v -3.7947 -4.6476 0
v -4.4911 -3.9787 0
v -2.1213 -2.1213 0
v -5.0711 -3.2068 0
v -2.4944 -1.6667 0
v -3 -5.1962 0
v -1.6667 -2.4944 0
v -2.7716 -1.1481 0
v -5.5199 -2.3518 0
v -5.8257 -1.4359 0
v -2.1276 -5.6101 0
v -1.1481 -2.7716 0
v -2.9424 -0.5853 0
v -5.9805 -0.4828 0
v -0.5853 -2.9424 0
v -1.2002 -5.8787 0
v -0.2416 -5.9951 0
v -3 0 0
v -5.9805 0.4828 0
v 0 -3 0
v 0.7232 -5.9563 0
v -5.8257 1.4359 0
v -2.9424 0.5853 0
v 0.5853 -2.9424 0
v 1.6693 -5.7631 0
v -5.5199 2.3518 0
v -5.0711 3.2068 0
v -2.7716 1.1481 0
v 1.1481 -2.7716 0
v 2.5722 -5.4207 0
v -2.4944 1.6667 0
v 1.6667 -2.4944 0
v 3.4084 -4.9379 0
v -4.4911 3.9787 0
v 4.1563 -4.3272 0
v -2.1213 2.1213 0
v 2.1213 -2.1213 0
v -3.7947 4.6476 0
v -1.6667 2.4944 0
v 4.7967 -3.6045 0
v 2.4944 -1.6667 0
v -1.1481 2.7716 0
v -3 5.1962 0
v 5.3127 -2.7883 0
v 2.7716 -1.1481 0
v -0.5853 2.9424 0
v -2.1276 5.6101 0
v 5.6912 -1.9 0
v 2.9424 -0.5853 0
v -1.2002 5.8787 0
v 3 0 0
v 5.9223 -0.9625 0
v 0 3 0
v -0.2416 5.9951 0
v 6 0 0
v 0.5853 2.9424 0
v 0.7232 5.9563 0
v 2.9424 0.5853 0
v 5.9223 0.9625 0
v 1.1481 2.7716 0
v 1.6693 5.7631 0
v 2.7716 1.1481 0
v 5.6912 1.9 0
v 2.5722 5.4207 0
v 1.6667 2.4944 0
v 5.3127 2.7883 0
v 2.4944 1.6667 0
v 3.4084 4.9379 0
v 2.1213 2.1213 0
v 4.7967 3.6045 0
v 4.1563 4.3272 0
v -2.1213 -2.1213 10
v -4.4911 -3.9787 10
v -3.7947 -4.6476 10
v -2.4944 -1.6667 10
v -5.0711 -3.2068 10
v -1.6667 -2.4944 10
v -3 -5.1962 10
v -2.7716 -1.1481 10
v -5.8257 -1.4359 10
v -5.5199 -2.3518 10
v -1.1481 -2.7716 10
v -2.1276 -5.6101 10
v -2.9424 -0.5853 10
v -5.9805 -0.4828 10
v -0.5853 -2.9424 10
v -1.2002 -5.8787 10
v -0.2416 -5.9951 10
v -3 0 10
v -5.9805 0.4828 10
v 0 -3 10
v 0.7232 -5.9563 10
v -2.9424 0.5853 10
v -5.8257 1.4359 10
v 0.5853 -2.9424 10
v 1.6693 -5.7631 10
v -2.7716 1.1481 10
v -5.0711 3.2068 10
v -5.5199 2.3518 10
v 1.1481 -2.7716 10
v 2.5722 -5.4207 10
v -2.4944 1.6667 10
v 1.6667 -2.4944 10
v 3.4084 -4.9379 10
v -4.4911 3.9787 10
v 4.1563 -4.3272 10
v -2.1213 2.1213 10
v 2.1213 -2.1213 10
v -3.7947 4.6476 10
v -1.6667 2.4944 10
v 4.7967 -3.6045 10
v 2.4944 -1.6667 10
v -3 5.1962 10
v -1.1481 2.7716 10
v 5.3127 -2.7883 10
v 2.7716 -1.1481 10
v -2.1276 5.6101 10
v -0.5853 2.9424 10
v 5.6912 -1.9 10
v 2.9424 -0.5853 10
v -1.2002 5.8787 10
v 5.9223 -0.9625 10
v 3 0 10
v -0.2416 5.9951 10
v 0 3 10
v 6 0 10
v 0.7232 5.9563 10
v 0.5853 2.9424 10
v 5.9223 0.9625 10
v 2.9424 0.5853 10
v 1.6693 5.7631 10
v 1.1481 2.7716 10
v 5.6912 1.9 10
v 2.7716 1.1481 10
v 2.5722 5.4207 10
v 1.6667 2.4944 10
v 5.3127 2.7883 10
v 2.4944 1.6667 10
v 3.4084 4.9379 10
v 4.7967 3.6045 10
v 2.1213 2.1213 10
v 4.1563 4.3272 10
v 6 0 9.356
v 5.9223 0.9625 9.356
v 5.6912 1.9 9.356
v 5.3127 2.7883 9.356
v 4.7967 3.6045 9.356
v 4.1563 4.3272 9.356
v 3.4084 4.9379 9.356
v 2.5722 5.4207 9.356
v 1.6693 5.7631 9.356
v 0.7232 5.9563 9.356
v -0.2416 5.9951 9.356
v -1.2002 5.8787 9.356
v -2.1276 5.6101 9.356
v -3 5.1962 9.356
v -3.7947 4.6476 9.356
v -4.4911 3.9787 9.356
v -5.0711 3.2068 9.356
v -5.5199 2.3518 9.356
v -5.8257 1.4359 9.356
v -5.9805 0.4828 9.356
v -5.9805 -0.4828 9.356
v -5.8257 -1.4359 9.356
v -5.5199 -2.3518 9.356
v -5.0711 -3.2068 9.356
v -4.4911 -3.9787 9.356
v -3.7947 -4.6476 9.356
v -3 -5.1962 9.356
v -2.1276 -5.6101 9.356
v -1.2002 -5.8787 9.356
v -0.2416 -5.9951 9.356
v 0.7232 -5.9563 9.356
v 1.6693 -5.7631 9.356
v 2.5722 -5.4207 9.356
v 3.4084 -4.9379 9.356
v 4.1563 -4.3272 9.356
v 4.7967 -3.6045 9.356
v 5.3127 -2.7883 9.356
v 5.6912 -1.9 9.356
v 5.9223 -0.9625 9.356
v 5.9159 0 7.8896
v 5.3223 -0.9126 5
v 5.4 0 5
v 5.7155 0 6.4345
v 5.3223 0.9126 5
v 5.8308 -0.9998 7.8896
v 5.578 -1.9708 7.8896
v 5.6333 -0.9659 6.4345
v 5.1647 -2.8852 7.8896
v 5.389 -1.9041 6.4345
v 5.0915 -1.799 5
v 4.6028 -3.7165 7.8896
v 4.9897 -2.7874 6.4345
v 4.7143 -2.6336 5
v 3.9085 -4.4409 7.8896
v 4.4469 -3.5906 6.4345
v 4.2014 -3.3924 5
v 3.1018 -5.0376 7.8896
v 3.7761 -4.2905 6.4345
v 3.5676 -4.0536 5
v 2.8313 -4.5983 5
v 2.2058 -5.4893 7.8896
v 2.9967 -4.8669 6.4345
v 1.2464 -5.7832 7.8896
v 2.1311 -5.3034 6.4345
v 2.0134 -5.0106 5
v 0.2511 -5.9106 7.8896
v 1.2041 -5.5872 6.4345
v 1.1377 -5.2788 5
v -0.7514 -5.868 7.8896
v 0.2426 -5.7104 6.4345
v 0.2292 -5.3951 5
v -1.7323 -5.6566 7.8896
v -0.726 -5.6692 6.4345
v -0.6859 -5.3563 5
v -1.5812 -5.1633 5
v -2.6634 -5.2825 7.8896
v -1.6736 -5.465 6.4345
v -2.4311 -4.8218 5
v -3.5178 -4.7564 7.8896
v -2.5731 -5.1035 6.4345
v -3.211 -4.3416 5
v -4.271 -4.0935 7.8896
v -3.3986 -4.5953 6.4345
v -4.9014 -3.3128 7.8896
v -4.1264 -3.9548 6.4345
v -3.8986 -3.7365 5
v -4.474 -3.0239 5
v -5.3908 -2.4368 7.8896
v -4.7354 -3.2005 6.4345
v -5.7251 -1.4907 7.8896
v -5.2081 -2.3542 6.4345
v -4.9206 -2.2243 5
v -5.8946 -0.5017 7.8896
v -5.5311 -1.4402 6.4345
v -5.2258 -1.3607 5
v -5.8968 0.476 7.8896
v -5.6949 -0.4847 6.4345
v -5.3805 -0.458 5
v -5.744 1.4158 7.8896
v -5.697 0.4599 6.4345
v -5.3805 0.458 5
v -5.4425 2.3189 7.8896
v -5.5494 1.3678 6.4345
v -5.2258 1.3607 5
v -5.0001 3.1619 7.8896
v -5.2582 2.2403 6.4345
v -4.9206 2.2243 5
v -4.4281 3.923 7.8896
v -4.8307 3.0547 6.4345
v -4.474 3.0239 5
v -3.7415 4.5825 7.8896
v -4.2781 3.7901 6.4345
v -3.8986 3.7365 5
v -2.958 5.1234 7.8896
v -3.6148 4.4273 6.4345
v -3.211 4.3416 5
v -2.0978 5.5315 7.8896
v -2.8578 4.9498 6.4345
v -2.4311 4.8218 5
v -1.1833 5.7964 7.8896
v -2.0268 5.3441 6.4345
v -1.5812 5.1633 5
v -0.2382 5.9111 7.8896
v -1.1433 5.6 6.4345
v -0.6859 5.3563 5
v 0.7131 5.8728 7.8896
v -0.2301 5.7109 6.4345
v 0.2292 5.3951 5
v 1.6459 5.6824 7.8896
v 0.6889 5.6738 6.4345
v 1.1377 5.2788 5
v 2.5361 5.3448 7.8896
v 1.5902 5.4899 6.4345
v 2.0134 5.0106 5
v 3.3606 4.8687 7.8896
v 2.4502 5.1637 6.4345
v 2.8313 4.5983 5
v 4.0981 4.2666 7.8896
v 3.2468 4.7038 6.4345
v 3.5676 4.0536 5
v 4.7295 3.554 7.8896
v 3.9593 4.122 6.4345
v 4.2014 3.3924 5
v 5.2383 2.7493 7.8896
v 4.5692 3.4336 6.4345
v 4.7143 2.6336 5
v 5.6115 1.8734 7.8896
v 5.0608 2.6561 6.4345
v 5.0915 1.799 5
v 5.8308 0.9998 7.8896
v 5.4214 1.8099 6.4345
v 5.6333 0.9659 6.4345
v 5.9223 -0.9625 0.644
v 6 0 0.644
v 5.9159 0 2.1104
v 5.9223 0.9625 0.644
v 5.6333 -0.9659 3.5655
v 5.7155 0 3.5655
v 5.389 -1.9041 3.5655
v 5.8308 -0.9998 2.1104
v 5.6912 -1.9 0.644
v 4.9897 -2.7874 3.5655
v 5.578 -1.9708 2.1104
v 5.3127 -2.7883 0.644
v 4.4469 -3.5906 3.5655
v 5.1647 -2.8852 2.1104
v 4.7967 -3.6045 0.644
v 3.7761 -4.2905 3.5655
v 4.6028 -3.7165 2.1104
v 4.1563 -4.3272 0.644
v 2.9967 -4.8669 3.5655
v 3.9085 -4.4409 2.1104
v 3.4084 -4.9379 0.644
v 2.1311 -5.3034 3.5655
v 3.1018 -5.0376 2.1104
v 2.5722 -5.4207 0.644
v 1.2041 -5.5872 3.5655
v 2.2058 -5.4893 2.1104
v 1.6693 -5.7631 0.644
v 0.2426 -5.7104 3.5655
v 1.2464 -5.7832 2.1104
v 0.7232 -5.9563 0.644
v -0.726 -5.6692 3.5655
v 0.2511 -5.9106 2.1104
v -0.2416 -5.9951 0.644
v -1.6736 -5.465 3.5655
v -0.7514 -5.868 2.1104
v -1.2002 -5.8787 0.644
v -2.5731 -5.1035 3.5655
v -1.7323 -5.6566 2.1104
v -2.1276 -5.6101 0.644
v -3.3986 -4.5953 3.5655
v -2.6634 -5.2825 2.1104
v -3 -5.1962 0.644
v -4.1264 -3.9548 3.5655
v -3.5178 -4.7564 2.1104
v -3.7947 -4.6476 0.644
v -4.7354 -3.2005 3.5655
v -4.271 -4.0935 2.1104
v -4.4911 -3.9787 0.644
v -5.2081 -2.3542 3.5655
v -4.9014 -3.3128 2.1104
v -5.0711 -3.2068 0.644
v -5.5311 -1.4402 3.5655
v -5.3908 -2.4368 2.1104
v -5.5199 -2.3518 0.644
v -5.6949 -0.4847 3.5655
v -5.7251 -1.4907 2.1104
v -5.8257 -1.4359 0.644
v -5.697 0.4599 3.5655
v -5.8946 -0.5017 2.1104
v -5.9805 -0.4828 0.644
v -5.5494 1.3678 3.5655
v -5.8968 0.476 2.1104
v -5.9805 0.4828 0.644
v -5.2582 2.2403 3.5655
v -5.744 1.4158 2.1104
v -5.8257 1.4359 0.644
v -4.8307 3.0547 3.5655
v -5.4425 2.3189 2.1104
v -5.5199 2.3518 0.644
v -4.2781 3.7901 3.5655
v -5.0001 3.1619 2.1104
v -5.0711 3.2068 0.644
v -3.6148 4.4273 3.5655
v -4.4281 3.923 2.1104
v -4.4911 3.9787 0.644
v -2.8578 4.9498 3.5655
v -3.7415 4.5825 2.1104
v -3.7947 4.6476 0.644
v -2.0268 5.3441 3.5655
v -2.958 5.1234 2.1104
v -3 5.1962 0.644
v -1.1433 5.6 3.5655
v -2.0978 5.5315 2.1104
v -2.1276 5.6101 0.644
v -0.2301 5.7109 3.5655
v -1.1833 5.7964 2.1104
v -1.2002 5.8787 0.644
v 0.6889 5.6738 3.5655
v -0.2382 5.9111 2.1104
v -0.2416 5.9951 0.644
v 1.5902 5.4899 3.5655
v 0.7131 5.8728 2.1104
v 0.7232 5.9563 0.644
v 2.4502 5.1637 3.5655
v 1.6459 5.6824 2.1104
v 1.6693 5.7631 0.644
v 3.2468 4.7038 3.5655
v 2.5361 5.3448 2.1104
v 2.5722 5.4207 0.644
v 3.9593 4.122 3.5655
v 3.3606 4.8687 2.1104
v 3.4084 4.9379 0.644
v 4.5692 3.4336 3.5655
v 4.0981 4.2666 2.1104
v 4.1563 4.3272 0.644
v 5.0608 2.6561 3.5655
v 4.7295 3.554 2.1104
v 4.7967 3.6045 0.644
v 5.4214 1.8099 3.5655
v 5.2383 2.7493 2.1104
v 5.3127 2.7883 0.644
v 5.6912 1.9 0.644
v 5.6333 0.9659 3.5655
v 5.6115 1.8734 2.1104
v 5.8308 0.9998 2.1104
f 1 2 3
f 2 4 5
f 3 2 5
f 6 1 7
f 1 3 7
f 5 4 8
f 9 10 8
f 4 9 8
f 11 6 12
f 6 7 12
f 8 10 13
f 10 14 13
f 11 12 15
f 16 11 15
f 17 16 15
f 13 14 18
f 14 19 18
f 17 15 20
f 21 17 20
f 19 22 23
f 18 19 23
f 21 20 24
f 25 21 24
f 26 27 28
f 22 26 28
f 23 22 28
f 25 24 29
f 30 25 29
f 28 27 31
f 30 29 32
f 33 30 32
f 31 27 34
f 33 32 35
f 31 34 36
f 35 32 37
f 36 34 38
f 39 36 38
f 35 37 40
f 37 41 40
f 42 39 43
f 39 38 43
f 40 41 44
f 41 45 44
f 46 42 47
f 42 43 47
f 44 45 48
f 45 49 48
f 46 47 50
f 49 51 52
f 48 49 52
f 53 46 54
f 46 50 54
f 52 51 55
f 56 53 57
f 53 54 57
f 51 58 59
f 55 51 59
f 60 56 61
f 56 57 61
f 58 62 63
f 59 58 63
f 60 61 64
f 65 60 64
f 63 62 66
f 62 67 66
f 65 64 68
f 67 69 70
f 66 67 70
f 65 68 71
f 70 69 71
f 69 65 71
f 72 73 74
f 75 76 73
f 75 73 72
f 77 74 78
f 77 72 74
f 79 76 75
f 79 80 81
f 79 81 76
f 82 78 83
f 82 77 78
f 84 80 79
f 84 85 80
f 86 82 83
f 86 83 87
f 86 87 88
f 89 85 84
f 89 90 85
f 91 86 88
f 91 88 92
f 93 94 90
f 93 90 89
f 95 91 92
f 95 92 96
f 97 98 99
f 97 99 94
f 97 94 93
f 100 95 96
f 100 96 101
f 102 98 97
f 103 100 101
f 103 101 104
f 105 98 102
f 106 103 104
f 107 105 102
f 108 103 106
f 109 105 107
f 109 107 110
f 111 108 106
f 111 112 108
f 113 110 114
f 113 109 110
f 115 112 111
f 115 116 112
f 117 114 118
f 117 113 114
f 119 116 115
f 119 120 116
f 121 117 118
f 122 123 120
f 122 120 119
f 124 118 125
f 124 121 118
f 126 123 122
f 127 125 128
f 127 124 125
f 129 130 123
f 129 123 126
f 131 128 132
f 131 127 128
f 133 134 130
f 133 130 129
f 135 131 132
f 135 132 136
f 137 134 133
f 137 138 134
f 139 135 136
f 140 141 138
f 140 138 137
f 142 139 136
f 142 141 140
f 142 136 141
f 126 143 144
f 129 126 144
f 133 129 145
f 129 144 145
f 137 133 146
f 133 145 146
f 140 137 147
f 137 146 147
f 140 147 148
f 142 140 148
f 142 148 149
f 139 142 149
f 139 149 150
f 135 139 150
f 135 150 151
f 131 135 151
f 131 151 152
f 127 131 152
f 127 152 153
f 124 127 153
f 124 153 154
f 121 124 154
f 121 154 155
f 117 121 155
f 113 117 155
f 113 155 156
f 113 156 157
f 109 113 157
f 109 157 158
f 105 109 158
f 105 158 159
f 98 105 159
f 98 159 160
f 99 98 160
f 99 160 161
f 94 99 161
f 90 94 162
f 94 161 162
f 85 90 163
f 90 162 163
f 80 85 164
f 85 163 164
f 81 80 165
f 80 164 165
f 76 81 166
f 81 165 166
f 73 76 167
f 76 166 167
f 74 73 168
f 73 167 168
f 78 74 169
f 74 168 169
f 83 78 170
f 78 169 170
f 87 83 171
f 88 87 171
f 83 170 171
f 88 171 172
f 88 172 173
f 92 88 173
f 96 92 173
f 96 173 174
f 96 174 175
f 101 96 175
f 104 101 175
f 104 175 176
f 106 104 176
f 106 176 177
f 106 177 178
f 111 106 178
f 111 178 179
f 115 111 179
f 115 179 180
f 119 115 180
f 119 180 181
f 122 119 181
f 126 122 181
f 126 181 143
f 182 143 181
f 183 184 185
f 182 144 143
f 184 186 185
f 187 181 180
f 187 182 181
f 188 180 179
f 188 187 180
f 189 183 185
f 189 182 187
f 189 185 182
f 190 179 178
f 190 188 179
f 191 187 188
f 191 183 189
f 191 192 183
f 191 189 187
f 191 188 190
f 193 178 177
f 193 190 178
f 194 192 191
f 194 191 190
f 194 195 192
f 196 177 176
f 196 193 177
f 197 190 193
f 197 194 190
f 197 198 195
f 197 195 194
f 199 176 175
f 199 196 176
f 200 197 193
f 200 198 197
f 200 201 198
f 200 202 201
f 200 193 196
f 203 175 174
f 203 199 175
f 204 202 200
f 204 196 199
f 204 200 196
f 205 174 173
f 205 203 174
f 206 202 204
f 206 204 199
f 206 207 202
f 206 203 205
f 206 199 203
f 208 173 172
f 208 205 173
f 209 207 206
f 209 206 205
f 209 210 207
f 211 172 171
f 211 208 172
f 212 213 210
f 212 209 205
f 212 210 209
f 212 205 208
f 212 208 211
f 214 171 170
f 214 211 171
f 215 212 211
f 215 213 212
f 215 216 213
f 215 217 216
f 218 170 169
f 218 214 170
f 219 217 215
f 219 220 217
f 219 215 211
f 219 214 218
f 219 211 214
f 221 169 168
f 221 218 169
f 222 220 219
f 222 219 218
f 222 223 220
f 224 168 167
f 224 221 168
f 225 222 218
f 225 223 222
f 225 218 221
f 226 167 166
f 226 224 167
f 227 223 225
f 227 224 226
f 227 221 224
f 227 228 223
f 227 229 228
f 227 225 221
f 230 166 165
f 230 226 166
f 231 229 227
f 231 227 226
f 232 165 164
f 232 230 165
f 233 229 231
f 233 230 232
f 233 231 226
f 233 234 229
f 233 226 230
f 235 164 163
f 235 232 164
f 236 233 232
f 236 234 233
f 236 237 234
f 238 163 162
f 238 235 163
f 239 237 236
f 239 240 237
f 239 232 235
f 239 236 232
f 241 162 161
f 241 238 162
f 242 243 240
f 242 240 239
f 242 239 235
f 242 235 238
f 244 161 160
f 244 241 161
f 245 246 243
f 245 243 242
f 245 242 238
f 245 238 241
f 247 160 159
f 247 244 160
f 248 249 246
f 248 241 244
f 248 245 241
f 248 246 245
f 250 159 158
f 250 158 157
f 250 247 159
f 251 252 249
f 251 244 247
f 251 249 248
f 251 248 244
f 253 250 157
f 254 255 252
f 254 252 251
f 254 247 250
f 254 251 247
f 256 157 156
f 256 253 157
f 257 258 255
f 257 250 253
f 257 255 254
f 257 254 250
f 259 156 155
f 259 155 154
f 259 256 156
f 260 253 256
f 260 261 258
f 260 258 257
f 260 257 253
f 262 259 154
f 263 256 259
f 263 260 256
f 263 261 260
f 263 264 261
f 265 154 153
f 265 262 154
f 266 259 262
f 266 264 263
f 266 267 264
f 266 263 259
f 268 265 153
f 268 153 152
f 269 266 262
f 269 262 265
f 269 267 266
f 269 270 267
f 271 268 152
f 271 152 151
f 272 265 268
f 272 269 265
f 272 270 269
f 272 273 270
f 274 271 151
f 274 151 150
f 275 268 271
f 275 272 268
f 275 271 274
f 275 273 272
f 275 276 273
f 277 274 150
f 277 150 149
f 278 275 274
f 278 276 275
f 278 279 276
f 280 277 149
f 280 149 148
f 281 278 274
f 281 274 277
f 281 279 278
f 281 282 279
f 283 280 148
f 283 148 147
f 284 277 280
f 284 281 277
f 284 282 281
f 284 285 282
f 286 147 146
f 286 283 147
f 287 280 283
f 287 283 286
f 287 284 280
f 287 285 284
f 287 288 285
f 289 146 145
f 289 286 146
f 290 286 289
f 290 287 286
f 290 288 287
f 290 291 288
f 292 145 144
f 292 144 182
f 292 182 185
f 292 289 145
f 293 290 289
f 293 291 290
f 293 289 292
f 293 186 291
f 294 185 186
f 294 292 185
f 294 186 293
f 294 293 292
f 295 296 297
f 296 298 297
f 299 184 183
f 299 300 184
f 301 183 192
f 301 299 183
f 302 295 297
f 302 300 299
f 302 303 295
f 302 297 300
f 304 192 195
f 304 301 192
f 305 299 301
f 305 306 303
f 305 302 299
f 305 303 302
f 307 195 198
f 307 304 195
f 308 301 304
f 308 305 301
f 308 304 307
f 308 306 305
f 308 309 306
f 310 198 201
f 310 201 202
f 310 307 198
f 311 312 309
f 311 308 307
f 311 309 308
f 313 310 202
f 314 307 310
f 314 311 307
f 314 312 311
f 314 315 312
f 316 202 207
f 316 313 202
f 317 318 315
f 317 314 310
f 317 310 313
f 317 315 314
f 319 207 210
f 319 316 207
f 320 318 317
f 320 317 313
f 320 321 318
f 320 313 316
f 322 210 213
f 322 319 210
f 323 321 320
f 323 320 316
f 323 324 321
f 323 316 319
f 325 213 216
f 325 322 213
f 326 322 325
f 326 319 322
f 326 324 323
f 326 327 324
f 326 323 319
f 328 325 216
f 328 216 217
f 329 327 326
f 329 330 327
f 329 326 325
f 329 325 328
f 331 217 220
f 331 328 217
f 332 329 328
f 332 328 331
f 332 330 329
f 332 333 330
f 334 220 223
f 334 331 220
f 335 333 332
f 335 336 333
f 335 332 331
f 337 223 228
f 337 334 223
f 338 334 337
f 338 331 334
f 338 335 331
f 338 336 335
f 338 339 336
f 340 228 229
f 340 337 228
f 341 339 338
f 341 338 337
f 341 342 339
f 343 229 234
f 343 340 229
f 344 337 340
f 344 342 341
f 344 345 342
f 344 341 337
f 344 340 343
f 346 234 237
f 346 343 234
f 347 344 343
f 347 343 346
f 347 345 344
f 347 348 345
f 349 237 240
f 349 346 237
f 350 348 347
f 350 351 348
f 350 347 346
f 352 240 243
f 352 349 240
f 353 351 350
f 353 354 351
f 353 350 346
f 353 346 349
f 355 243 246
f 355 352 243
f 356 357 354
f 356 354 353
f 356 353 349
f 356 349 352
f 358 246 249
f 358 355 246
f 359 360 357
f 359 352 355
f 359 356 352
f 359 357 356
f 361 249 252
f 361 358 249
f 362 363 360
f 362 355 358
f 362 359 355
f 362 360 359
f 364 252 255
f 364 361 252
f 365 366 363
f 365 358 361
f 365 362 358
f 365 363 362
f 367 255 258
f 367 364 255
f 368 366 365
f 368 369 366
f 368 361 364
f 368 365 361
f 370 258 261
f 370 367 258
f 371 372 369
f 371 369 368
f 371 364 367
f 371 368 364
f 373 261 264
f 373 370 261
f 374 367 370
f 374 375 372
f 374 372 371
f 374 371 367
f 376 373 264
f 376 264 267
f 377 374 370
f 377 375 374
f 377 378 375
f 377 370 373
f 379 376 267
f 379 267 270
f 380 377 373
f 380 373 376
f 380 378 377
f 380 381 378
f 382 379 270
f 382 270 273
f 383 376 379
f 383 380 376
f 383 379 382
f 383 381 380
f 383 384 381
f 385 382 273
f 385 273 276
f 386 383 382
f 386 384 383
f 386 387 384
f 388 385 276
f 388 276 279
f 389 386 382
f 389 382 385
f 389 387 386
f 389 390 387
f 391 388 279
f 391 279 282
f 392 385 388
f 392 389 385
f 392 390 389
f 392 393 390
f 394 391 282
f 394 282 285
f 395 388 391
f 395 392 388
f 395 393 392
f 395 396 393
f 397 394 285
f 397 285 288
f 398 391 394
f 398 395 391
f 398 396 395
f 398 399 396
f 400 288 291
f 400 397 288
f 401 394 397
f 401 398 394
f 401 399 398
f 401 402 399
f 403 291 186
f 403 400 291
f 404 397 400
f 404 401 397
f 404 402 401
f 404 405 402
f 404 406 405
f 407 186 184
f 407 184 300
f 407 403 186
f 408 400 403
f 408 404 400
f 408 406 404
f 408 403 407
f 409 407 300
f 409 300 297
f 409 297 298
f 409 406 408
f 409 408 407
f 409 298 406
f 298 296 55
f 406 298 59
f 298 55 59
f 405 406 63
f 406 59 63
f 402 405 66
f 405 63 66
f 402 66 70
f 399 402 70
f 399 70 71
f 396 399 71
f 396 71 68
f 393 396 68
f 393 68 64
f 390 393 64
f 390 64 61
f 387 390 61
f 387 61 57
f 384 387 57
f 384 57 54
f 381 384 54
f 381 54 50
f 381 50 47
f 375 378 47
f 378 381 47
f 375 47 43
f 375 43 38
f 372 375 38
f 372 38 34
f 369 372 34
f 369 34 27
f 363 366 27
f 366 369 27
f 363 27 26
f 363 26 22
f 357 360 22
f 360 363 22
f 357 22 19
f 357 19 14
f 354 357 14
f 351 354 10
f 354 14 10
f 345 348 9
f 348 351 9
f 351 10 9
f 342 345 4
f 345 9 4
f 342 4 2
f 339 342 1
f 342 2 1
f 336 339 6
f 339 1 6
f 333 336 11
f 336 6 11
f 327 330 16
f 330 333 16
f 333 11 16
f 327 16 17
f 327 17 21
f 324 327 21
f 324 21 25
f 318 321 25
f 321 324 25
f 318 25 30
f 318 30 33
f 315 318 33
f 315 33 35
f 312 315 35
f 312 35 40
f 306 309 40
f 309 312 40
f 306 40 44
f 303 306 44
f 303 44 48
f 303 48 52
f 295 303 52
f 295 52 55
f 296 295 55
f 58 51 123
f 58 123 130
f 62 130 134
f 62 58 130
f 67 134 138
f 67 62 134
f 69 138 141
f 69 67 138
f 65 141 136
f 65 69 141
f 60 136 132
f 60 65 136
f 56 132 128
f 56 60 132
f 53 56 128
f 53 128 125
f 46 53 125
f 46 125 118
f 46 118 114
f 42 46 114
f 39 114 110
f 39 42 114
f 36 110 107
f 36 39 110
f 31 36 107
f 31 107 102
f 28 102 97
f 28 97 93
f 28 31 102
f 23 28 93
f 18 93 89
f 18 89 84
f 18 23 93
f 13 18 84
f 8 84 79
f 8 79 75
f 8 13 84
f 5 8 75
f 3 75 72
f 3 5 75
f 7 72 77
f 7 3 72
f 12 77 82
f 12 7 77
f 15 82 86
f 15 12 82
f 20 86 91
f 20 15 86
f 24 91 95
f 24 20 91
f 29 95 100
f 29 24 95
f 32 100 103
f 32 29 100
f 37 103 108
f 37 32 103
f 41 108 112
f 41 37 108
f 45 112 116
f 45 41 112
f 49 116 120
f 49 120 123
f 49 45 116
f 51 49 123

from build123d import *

# Parameters (mm, degrees)
IZIM1_R                     = 6
IZIM1_R_2                   = 3
Y_KSEKLIK_EKSTR_ZYON1_DEPTH = 10


with BuildPart() as part:
    # Çizim1 → Yükseklik-Ekstrüzyon1 (new body)
    with BuildSketch(Plane.XY):
        Circle(IZIM1_R)
        Circle(IZIM1_R_2, mode=Mode.SUBTRACT)
    extrude(amount=Y_KSEKLIK_EKSTR_ZYON1_DEPTH)

    # Çizim2 → Kes-Döndür1 (revolve, cut)
    with BuildSketch(Plane(origin=(0, 0, 0), x_dir=(1, 0, 0), z_dir=(0, 1, 0)), mode=Mode.PRIVATE) as kes_d_nd_r1_sk:
        with BuildLine():
            ThreePointArc((-5.4, -5), (-5.830212785, -2.839937738), (-6, -0.644004152))
            Line((-6, -0.644004152), (-6, -9.355995848))
            ThreePointArc((-6, -9.355995848), (-5.830212785, -7.160062262), (-5.4, -5))
        make_face()
    revolve(kes_d_nd_r1_sk.sketch.rotate(Axis((0, 0, 10), (0, 0, -1)), 180), axis=Axis((0, 0, 10), (0, 0, -1)), mode=Mode.SUBTRACT)


solid = part.part
